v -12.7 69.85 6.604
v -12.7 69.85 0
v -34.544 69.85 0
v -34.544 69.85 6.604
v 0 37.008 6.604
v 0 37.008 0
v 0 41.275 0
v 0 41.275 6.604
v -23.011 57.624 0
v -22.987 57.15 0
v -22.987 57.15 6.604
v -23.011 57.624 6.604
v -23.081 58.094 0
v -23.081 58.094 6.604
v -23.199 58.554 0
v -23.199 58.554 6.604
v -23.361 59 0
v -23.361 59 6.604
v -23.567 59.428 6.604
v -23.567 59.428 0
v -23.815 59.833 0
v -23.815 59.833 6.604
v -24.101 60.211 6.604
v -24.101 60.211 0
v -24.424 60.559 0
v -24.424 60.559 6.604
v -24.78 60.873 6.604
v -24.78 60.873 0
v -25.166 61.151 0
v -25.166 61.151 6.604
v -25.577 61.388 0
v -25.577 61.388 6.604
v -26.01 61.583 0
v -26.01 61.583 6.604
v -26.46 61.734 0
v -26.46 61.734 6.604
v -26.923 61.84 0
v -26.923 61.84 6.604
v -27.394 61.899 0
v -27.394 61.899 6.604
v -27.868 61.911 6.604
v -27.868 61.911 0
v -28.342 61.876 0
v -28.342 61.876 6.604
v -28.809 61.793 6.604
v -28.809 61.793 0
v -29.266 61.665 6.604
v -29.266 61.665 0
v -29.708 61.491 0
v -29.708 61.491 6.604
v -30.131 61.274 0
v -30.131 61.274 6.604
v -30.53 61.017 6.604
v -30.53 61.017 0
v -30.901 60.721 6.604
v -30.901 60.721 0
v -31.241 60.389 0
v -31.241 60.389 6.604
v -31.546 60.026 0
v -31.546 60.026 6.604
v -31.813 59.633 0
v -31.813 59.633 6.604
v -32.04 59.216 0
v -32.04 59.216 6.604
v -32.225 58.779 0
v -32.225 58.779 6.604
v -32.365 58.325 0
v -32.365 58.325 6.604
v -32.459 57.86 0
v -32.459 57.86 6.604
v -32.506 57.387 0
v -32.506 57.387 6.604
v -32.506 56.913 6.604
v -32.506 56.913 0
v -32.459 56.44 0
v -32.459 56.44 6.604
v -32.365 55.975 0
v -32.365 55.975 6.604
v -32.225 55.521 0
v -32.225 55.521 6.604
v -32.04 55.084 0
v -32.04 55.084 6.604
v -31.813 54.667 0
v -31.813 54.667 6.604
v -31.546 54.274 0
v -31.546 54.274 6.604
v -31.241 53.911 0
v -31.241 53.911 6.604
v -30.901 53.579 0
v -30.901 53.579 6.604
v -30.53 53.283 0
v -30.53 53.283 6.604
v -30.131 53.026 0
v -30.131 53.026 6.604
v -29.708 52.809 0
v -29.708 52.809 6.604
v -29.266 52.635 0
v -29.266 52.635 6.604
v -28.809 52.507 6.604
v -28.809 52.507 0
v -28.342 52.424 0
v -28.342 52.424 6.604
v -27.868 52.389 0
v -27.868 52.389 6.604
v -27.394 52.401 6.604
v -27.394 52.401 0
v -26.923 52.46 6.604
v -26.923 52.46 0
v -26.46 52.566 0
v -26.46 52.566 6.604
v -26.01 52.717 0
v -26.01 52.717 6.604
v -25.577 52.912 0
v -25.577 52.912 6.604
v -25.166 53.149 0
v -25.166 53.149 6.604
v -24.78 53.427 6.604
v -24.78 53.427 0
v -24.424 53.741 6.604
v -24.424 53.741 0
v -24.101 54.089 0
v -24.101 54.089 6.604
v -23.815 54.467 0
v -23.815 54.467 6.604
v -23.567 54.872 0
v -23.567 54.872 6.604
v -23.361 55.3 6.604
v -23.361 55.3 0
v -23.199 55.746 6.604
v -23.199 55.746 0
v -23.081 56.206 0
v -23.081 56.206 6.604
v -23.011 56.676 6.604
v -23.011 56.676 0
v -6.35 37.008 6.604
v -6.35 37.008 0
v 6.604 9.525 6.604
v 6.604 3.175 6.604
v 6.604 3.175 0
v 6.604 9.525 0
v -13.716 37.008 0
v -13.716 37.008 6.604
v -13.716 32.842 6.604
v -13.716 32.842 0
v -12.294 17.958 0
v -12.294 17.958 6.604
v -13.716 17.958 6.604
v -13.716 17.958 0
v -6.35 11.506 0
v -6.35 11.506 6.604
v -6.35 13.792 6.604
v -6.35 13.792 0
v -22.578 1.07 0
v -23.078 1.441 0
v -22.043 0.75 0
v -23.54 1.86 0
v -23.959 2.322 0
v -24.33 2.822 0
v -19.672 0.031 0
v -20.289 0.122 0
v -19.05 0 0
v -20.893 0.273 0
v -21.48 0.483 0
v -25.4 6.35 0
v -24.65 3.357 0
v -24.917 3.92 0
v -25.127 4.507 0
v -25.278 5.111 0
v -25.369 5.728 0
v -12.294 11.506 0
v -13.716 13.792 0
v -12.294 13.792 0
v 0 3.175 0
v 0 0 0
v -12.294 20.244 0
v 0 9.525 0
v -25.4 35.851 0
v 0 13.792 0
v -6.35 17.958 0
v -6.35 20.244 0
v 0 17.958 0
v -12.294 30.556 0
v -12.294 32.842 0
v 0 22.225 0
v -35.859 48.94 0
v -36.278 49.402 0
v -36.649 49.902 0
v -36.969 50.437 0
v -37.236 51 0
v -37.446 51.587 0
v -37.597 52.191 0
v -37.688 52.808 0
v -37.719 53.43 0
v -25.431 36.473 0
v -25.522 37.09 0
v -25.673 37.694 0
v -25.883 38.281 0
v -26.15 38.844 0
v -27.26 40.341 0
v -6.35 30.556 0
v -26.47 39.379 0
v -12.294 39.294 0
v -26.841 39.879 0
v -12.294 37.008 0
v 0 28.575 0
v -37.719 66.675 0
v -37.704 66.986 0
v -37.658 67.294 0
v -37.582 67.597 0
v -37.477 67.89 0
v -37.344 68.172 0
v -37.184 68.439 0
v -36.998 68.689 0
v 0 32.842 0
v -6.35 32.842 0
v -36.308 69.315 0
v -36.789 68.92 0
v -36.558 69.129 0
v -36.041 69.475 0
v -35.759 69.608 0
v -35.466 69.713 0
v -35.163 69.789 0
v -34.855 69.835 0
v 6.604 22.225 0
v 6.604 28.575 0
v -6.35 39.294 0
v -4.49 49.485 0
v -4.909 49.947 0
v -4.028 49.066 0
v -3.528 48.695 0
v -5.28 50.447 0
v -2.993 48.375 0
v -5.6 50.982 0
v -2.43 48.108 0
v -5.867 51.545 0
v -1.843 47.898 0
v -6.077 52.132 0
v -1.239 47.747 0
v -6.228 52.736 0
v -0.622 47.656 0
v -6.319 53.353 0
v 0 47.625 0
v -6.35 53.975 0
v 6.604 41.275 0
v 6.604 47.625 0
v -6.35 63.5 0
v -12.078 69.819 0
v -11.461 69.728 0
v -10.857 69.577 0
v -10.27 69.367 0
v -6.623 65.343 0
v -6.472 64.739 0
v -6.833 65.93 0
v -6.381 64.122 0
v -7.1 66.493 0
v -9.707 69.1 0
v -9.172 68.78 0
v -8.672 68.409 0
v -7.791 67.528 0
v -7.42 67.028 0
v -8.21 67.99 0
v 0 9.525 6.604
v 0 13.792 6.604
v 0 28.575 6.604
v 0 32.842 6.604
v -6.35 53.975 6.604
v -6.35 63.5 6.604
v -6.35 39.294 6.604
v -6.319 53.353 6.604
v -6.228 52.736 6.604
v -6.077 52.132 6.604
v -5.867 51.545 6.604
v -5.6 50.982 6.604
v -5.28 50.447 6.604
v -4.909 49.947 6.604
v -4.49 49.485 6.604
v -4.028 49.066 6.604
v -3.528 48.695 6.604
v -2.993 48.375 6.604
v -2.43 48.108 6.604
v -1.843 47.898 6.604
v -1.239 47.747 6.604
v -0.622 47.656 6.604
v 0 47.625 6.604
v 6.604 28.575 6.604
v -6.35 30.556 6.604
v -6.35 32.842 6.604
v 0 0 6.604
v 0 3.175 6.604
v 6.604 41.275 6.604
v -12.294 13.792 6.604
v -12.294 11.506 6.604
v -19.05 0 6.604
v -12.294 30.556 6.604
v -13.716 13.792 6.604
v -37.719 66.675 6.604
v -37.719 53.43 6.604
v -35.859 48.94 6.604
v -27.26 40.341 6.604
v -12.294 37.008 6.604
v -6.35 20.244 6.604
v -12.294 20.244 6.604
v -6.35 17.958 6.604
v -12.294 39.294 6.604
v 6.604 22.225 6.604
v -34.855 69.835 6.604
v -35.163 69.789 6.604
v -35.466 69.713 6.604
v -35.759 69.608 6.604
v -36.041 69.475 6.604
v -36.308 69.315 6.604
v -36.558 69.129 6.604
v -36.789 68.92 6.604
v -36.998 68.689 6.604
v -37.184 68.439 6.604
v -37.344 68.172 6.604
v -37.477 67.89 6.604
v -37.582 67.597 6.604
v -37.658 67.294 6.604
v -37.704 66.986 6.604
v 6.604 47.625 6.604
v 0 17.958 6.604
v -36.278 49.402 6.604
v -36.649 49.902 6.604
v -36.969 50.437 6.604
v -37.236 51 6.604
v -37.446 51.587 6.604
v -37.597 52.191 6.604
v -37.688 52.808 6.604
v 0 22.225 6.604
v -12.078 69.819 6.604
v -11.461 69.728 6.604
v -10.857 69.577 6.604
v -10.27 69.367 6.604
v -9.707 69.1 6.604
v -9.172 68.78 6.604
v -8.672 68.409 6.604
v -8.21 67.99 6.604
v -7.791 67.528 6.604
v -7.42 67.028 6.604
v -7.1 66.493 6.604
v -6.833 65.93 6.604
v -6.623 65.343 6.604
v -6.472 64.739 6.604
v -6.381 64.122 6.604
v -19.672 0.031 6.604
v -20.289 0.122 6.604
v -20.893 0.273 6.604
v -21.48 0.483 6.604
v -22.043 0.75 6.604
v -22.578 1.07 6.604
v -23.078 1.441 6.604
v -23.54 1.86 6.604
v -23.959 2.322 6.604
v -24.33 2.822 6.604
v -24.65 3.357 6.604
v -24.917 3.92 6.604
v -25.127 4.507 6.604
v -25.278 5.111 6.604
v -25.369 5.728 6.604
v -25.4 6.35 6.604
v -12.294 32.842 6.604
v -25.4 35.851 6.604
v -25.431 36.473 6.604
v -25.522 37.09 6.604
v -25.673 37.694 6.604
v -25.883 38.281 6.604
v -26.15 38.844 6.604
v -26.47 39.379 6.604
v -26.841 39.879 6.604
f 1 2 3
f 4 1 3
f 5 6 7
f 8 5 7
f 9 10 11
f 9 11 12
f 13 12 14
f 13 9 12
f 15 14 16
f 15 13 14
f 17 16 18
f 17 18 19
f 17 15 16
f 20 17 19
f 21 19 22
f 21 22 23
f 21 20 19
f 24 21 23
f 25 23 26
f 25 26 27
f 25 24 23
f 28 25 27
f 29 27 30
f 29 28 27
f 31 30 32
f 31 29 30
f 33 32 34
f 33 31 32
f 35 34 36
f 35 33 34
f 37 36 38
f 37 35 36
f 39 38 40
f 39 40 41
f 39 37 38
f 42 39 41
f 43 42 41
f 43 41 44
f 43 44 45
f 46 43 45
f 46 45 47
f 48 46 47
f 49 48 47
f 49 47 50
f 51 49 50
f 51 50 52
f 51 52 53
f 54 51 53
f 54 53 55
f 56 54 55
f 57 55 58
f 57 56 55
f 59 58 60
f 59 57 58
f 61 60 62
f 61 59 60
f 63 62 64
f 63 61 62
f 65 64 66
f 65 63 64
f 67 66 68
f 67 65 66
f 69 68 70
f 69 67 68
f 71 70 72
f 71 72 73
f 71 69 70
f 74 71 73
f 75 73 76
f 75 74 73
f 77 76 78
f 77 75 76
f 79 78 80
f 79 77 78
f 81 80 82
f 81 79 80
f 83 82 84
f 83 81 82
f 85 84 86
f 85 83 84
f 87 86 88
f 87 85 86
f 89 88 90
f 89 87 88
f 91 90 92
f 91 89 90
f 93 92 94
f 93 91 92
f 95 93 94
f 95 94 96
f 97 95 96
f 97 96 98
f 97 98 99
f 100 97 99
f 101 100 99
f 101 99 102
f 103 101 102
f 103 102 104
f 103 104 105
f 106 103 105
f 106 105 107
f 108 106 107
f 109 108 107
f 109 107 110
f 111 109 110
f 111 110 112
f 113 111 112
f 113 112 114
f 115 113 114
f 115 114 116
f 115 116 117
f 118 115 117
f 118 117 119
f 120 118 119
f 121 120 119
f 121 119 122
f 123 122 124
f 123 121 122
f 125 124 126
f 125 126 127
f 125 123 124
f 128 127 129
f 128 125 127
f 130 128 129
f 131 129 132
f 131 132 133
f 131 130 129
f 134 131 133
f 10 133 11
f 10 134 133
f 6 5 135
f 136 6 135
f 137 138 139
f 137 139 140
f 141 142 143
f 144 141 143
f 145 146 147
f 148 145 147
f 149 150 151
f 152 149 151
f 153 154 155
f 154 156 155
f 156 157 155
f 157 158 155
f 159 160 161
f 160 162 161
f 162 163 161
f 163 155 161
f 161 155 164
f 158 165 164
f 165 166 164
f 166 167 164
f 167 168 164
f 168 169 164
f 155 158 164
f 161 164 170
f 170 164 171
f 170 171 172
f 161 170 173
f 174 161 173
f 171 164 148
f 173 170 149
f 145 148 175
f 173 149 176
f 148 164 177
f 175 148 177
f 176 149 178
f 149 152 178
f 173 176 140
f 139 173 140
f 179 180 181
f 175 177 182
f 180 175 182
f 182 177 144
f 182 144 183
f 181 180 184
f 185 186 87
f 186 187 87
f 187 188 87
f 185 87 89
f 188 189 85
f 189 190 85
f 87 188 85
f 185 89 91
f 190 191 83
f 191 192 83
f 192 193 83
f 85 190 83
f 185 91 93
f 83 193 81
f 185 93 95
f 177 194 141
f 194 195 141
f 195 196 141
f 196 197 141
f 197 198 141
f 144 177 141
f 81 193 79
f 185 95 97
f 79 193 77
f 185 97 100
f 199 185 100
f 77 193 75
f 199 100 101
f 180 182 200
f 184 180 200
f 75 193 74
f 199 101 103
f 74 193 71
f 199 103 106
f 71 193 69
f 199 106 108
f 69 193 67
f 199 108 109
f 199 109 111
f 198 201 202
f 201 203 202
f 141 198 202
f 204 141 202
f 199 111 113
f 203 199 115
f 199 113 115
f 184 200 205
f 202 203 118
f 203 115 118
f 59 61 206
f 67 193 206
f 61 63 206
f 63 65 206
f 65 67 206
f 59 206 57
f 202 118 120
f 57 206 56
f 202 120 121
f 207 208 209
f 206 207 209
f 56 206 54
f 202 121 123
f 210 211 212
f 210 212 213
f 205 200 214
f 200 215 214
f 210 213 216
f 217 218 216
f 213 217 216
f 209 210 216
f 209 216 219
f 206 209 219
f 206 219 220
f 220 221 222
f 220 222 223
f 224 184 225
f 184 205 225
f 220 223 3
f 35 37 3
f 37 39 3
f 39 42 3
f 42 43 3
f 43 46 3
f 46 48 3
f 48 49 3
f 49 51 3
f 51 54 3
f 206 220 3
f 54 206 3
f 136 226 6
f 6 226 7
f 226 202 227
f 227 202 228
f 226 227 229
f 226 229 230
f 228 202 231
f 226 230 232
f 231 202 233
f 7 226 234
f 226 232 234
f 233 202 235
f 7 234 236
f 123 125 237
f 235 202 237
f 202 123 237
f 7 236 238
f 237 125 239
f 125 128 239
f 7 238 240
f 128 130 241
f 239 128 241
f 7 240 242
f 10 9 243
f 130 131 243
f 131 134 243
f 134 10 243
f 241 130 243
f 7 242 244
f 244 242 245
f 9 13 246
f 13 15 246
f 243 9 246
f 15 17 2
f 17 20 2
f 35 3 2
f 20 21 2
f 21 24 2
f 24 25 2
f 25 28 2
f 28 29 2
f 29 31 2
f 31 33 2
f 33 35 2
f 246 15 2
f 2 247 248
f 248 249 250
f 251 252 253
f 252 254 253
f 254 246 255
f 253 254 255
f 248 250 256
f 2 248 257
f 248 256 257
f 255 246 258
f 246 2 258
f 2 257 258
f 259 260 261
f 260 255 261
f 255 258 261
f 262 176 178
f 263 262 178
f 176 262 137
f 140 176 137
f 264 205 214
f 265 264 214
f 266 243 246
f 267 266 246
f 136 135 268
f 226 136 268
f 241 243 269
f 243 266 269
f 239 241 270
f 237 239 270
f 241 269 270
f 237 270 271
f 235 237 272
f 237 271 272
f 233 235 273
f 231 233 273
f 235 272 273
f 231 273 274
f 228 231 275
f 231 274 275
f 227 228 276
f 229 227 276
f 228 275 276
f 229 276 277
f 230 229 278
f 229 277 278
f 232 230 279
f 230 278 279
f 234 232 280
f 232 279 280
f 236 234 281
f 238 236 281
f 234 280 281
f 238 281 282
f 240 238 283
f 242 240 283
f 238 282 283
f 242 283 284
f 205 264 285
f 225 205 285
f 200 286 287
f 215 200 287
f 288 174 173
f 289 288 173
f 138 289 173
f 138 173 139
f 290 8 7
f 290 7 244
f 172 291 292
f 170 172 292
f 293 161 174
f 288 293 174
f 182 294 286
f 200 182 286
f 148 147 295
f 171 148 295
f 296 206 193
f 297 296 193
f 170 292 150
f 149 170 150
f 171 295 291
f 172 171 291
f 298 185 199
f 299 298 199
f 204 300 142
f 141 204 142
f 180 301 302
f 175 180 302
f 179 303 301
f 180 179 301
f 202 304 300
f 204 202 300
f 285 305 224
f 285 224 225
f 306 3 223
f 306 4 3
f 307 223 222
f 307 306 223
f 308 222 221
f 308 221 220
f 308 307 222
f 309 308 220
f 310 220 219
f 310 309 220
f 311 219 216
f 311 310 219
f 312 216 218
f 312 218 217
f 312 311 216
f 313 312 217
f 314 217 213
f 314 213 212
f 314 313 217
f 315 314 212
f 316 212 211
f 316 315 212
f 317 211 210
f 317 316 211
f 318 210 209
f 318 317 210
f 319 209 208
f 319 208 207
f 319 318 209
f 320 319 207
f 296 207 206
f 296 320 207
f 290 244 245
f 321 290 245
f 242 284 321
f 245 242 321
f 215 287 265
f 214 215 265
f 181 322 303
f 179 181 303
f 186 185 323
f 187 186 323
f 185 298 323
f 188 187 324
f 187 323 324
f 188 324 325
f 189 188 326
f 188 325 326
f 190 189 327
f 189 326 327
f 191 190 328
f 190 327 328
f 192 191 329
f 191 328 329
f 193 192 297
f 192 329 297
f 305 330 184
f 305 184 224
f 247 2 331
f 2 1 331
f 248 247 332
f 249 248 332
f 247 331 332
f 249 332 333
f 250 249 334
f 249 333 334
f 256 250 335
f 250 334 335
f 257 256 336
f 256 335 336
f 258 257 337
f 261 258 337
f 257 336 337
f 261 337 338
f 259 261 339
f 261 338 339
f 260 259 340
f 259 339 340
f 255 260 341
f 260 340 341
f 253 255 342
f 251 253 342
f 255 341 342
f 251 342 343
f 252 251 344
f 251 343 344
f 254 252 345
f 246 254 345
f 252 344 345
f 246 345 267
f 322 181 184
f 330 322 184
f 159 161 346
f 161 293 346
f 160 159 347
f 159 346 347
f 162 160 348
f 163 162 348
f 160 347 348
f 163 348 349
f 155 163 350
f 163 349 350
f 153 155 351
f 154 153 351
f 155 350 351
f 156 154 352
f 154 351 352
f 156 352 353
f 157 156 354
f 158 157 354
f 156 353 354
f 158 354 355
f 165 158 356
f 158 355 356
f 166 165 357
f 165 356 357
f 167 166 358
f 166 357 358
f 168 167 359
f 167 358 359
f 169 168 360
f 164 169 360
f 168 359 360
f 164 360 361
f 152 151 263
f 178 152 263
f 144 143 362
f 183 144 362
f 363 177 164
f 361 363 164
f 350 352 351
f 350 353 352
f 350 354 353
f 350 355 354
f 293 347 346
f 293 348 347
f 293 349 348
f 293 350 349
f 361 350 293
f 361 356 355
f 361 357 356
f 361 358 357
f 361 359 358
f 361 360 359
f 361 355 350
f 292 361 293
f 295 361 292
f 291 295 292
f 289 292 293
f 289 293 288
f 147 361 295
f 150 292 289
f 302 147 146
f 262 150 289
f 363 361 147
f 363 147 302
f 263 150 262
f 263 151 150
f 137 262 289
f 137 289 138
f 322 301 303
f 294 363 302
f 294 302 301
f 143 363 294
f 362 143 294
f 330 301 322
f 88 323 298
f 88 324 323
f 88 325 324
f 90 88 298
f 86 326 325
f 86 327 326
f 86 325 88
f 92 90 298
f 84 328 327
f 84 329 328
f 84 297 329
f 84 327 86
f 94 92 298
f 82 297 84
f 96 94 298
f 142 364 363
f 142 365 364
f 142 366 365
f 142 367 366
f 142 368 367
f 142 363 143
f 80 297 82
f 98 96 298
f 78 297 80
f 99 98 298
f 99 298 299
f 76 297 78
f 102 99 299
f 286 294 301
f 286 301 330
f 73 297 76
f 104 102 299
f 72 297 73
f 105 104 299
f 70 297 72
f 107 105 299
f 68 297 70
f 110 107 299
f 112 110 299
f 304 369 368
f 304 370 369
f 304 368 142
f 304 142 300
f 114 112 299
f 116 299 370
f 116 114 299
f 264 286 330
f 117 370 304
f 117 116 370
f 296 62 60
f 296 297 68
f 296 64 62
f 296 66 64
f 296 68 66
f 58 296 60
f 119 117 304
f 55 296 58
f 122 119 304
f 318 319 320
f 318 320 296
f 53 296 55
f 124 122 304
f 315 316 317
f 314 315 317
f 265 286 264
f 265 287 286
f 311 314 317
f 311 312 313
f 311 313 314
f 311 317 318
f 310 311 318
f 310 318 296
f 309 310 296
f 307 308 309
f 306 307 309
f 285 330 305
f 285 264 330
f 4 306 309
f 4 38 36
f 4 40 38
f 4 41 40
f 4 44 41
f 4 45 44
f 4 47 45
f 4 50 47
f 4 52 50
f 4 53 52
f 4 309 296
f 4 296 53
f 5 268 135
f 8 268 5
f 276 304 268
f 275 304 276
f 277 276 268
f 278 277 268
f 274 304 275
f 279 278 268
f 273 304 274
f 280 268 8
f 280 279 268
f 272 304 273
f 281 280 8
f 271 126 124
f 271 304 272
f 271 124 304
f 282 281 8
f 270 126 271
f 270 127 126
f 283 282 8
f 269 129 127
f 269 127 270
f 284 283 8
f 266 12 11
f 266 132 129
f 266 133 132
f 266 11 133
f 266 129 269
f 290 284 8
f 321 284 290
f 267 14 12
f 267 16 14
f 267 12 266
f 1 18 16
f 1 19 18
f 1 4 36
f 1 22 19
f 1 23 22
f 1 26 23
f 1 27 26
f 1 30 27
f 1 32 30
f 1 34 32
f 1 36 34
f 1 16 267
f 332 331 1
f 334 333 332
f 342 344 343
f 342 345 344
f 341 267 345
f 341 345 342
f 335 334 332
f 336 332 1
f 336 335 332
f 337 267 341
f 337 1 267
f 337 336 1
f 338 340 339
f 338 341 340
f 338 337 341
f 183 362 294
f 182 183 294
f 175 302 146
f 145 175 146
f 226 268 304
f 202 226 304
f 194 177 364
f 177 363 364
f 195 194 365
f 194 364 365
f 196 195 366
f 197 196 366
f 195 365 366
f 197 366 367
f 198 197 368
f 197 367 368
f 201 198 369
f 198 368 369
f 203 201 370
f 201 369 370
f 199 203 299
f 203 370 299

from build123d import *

# Parameters (mm, degrees)
SKETCH1_R           = 4.7625
BOSS_EXTRUDE1_DEPTH = 6.604
CUT_EXTRUDE1_DEPTH  = 7.604
SKETCH3_W           = 6.604
SKETCH3_H           = 6.35
BOSS_EXTRUDE2_DEPTH = 6.604
FILLET1_R           = 6.35
FILLET2_R           = 3.175


with BuildPart() as part:
    # Sketch1 → Boss-Extrude1 (new body)
    with BuildSketch(Plane.XY):
        Polygon((0, 0), (0, 47.625), (-6.35, 47.625), (-6.35, 69.85), (-37.719, 69.85), (-37.719, 50.8), (-25.4, 38.481), (-25.4, 0), align=None)
        with Locations((-27.7495, 57.15)):
            Circle(SKETCH1_R, mode=Mode.SUBTRACT)
    extrude(amount=BOSS_EXTRUDE1_DEPTH)

    # Sketch2 → Cut-Extrude1 (cut, through all)
    with BuildSketch(Plane.XY.offset(6.604)):
        Polygon((-12.2936, 37.0078), (-13.716, 37.0078), (-13.716, 32.8422), (-12.2936, 32.8422), (-12.2936, 30.5562), (-6.35, 30.5562), (-6.35, 32.8422), (0, 32.8422), (0, 37.0078), (-6.35, 37.0078), (-6.35, 39.2938), (-12.2936, 39.2938), align=None)
        Polygon((-12.2936, 20.2438), (-12.2936, 17.9578), (-13.716, 17.9578), (-13.716, 13.7922), (-12.2936, 13.7922), (-12.2936, 11.5062), (-6.35, 11.5062), (-6.35, 13.7922), (0, 13.7922), (0, 17.9578), (-6.35, 17.9578), (-6.35, 20.2438), align=None)
    extrude(amount=-CUT_EXTRUDE1_DEPTH, mode=Mode.SUBTRACT)

    # Sketch3 → Boss-Extrude2 (add)
    with BuildSketch(Plane.XY.offset(6.604)):
        with Locations((3.302, 44.45)):
            Rectangle(SKETCH3_W, SKETCH3_H)
        with Locations((3.302, 25.4)):
            Rectangle(SKETCH3_W, SKETCH3_H)
        with Locations((3.302, 6.35)):
            Rectangle(SKETCH3_W, SKETCH3_H)
    extrude(amount=-BOSS_EXTRUDE2_DEPTH)

    # Fillet1
    fillet1_edges = [part.edges().sort_by_distance(p)[0] for p in [
        (-25.4, 0, 3.302),
        (-25.4, 38.481, 3.302),
        (-37.719, 50.8, 3.302),
        (-6.35, 69.85, 3.302),
        (-6.35, 47.625, 3.302),
    ]]
    fillet(fillet1_edges, radius=FILLET1_R)

    # Fillet2
    fillet2_edges = [part.edges().sort_by_distance(p)[0] for p in [
        (-37.719, 69.85, 3.302),
    ]]
    fillet(fillet2_edges, radius=FILLET2_R)


solid = part.part
